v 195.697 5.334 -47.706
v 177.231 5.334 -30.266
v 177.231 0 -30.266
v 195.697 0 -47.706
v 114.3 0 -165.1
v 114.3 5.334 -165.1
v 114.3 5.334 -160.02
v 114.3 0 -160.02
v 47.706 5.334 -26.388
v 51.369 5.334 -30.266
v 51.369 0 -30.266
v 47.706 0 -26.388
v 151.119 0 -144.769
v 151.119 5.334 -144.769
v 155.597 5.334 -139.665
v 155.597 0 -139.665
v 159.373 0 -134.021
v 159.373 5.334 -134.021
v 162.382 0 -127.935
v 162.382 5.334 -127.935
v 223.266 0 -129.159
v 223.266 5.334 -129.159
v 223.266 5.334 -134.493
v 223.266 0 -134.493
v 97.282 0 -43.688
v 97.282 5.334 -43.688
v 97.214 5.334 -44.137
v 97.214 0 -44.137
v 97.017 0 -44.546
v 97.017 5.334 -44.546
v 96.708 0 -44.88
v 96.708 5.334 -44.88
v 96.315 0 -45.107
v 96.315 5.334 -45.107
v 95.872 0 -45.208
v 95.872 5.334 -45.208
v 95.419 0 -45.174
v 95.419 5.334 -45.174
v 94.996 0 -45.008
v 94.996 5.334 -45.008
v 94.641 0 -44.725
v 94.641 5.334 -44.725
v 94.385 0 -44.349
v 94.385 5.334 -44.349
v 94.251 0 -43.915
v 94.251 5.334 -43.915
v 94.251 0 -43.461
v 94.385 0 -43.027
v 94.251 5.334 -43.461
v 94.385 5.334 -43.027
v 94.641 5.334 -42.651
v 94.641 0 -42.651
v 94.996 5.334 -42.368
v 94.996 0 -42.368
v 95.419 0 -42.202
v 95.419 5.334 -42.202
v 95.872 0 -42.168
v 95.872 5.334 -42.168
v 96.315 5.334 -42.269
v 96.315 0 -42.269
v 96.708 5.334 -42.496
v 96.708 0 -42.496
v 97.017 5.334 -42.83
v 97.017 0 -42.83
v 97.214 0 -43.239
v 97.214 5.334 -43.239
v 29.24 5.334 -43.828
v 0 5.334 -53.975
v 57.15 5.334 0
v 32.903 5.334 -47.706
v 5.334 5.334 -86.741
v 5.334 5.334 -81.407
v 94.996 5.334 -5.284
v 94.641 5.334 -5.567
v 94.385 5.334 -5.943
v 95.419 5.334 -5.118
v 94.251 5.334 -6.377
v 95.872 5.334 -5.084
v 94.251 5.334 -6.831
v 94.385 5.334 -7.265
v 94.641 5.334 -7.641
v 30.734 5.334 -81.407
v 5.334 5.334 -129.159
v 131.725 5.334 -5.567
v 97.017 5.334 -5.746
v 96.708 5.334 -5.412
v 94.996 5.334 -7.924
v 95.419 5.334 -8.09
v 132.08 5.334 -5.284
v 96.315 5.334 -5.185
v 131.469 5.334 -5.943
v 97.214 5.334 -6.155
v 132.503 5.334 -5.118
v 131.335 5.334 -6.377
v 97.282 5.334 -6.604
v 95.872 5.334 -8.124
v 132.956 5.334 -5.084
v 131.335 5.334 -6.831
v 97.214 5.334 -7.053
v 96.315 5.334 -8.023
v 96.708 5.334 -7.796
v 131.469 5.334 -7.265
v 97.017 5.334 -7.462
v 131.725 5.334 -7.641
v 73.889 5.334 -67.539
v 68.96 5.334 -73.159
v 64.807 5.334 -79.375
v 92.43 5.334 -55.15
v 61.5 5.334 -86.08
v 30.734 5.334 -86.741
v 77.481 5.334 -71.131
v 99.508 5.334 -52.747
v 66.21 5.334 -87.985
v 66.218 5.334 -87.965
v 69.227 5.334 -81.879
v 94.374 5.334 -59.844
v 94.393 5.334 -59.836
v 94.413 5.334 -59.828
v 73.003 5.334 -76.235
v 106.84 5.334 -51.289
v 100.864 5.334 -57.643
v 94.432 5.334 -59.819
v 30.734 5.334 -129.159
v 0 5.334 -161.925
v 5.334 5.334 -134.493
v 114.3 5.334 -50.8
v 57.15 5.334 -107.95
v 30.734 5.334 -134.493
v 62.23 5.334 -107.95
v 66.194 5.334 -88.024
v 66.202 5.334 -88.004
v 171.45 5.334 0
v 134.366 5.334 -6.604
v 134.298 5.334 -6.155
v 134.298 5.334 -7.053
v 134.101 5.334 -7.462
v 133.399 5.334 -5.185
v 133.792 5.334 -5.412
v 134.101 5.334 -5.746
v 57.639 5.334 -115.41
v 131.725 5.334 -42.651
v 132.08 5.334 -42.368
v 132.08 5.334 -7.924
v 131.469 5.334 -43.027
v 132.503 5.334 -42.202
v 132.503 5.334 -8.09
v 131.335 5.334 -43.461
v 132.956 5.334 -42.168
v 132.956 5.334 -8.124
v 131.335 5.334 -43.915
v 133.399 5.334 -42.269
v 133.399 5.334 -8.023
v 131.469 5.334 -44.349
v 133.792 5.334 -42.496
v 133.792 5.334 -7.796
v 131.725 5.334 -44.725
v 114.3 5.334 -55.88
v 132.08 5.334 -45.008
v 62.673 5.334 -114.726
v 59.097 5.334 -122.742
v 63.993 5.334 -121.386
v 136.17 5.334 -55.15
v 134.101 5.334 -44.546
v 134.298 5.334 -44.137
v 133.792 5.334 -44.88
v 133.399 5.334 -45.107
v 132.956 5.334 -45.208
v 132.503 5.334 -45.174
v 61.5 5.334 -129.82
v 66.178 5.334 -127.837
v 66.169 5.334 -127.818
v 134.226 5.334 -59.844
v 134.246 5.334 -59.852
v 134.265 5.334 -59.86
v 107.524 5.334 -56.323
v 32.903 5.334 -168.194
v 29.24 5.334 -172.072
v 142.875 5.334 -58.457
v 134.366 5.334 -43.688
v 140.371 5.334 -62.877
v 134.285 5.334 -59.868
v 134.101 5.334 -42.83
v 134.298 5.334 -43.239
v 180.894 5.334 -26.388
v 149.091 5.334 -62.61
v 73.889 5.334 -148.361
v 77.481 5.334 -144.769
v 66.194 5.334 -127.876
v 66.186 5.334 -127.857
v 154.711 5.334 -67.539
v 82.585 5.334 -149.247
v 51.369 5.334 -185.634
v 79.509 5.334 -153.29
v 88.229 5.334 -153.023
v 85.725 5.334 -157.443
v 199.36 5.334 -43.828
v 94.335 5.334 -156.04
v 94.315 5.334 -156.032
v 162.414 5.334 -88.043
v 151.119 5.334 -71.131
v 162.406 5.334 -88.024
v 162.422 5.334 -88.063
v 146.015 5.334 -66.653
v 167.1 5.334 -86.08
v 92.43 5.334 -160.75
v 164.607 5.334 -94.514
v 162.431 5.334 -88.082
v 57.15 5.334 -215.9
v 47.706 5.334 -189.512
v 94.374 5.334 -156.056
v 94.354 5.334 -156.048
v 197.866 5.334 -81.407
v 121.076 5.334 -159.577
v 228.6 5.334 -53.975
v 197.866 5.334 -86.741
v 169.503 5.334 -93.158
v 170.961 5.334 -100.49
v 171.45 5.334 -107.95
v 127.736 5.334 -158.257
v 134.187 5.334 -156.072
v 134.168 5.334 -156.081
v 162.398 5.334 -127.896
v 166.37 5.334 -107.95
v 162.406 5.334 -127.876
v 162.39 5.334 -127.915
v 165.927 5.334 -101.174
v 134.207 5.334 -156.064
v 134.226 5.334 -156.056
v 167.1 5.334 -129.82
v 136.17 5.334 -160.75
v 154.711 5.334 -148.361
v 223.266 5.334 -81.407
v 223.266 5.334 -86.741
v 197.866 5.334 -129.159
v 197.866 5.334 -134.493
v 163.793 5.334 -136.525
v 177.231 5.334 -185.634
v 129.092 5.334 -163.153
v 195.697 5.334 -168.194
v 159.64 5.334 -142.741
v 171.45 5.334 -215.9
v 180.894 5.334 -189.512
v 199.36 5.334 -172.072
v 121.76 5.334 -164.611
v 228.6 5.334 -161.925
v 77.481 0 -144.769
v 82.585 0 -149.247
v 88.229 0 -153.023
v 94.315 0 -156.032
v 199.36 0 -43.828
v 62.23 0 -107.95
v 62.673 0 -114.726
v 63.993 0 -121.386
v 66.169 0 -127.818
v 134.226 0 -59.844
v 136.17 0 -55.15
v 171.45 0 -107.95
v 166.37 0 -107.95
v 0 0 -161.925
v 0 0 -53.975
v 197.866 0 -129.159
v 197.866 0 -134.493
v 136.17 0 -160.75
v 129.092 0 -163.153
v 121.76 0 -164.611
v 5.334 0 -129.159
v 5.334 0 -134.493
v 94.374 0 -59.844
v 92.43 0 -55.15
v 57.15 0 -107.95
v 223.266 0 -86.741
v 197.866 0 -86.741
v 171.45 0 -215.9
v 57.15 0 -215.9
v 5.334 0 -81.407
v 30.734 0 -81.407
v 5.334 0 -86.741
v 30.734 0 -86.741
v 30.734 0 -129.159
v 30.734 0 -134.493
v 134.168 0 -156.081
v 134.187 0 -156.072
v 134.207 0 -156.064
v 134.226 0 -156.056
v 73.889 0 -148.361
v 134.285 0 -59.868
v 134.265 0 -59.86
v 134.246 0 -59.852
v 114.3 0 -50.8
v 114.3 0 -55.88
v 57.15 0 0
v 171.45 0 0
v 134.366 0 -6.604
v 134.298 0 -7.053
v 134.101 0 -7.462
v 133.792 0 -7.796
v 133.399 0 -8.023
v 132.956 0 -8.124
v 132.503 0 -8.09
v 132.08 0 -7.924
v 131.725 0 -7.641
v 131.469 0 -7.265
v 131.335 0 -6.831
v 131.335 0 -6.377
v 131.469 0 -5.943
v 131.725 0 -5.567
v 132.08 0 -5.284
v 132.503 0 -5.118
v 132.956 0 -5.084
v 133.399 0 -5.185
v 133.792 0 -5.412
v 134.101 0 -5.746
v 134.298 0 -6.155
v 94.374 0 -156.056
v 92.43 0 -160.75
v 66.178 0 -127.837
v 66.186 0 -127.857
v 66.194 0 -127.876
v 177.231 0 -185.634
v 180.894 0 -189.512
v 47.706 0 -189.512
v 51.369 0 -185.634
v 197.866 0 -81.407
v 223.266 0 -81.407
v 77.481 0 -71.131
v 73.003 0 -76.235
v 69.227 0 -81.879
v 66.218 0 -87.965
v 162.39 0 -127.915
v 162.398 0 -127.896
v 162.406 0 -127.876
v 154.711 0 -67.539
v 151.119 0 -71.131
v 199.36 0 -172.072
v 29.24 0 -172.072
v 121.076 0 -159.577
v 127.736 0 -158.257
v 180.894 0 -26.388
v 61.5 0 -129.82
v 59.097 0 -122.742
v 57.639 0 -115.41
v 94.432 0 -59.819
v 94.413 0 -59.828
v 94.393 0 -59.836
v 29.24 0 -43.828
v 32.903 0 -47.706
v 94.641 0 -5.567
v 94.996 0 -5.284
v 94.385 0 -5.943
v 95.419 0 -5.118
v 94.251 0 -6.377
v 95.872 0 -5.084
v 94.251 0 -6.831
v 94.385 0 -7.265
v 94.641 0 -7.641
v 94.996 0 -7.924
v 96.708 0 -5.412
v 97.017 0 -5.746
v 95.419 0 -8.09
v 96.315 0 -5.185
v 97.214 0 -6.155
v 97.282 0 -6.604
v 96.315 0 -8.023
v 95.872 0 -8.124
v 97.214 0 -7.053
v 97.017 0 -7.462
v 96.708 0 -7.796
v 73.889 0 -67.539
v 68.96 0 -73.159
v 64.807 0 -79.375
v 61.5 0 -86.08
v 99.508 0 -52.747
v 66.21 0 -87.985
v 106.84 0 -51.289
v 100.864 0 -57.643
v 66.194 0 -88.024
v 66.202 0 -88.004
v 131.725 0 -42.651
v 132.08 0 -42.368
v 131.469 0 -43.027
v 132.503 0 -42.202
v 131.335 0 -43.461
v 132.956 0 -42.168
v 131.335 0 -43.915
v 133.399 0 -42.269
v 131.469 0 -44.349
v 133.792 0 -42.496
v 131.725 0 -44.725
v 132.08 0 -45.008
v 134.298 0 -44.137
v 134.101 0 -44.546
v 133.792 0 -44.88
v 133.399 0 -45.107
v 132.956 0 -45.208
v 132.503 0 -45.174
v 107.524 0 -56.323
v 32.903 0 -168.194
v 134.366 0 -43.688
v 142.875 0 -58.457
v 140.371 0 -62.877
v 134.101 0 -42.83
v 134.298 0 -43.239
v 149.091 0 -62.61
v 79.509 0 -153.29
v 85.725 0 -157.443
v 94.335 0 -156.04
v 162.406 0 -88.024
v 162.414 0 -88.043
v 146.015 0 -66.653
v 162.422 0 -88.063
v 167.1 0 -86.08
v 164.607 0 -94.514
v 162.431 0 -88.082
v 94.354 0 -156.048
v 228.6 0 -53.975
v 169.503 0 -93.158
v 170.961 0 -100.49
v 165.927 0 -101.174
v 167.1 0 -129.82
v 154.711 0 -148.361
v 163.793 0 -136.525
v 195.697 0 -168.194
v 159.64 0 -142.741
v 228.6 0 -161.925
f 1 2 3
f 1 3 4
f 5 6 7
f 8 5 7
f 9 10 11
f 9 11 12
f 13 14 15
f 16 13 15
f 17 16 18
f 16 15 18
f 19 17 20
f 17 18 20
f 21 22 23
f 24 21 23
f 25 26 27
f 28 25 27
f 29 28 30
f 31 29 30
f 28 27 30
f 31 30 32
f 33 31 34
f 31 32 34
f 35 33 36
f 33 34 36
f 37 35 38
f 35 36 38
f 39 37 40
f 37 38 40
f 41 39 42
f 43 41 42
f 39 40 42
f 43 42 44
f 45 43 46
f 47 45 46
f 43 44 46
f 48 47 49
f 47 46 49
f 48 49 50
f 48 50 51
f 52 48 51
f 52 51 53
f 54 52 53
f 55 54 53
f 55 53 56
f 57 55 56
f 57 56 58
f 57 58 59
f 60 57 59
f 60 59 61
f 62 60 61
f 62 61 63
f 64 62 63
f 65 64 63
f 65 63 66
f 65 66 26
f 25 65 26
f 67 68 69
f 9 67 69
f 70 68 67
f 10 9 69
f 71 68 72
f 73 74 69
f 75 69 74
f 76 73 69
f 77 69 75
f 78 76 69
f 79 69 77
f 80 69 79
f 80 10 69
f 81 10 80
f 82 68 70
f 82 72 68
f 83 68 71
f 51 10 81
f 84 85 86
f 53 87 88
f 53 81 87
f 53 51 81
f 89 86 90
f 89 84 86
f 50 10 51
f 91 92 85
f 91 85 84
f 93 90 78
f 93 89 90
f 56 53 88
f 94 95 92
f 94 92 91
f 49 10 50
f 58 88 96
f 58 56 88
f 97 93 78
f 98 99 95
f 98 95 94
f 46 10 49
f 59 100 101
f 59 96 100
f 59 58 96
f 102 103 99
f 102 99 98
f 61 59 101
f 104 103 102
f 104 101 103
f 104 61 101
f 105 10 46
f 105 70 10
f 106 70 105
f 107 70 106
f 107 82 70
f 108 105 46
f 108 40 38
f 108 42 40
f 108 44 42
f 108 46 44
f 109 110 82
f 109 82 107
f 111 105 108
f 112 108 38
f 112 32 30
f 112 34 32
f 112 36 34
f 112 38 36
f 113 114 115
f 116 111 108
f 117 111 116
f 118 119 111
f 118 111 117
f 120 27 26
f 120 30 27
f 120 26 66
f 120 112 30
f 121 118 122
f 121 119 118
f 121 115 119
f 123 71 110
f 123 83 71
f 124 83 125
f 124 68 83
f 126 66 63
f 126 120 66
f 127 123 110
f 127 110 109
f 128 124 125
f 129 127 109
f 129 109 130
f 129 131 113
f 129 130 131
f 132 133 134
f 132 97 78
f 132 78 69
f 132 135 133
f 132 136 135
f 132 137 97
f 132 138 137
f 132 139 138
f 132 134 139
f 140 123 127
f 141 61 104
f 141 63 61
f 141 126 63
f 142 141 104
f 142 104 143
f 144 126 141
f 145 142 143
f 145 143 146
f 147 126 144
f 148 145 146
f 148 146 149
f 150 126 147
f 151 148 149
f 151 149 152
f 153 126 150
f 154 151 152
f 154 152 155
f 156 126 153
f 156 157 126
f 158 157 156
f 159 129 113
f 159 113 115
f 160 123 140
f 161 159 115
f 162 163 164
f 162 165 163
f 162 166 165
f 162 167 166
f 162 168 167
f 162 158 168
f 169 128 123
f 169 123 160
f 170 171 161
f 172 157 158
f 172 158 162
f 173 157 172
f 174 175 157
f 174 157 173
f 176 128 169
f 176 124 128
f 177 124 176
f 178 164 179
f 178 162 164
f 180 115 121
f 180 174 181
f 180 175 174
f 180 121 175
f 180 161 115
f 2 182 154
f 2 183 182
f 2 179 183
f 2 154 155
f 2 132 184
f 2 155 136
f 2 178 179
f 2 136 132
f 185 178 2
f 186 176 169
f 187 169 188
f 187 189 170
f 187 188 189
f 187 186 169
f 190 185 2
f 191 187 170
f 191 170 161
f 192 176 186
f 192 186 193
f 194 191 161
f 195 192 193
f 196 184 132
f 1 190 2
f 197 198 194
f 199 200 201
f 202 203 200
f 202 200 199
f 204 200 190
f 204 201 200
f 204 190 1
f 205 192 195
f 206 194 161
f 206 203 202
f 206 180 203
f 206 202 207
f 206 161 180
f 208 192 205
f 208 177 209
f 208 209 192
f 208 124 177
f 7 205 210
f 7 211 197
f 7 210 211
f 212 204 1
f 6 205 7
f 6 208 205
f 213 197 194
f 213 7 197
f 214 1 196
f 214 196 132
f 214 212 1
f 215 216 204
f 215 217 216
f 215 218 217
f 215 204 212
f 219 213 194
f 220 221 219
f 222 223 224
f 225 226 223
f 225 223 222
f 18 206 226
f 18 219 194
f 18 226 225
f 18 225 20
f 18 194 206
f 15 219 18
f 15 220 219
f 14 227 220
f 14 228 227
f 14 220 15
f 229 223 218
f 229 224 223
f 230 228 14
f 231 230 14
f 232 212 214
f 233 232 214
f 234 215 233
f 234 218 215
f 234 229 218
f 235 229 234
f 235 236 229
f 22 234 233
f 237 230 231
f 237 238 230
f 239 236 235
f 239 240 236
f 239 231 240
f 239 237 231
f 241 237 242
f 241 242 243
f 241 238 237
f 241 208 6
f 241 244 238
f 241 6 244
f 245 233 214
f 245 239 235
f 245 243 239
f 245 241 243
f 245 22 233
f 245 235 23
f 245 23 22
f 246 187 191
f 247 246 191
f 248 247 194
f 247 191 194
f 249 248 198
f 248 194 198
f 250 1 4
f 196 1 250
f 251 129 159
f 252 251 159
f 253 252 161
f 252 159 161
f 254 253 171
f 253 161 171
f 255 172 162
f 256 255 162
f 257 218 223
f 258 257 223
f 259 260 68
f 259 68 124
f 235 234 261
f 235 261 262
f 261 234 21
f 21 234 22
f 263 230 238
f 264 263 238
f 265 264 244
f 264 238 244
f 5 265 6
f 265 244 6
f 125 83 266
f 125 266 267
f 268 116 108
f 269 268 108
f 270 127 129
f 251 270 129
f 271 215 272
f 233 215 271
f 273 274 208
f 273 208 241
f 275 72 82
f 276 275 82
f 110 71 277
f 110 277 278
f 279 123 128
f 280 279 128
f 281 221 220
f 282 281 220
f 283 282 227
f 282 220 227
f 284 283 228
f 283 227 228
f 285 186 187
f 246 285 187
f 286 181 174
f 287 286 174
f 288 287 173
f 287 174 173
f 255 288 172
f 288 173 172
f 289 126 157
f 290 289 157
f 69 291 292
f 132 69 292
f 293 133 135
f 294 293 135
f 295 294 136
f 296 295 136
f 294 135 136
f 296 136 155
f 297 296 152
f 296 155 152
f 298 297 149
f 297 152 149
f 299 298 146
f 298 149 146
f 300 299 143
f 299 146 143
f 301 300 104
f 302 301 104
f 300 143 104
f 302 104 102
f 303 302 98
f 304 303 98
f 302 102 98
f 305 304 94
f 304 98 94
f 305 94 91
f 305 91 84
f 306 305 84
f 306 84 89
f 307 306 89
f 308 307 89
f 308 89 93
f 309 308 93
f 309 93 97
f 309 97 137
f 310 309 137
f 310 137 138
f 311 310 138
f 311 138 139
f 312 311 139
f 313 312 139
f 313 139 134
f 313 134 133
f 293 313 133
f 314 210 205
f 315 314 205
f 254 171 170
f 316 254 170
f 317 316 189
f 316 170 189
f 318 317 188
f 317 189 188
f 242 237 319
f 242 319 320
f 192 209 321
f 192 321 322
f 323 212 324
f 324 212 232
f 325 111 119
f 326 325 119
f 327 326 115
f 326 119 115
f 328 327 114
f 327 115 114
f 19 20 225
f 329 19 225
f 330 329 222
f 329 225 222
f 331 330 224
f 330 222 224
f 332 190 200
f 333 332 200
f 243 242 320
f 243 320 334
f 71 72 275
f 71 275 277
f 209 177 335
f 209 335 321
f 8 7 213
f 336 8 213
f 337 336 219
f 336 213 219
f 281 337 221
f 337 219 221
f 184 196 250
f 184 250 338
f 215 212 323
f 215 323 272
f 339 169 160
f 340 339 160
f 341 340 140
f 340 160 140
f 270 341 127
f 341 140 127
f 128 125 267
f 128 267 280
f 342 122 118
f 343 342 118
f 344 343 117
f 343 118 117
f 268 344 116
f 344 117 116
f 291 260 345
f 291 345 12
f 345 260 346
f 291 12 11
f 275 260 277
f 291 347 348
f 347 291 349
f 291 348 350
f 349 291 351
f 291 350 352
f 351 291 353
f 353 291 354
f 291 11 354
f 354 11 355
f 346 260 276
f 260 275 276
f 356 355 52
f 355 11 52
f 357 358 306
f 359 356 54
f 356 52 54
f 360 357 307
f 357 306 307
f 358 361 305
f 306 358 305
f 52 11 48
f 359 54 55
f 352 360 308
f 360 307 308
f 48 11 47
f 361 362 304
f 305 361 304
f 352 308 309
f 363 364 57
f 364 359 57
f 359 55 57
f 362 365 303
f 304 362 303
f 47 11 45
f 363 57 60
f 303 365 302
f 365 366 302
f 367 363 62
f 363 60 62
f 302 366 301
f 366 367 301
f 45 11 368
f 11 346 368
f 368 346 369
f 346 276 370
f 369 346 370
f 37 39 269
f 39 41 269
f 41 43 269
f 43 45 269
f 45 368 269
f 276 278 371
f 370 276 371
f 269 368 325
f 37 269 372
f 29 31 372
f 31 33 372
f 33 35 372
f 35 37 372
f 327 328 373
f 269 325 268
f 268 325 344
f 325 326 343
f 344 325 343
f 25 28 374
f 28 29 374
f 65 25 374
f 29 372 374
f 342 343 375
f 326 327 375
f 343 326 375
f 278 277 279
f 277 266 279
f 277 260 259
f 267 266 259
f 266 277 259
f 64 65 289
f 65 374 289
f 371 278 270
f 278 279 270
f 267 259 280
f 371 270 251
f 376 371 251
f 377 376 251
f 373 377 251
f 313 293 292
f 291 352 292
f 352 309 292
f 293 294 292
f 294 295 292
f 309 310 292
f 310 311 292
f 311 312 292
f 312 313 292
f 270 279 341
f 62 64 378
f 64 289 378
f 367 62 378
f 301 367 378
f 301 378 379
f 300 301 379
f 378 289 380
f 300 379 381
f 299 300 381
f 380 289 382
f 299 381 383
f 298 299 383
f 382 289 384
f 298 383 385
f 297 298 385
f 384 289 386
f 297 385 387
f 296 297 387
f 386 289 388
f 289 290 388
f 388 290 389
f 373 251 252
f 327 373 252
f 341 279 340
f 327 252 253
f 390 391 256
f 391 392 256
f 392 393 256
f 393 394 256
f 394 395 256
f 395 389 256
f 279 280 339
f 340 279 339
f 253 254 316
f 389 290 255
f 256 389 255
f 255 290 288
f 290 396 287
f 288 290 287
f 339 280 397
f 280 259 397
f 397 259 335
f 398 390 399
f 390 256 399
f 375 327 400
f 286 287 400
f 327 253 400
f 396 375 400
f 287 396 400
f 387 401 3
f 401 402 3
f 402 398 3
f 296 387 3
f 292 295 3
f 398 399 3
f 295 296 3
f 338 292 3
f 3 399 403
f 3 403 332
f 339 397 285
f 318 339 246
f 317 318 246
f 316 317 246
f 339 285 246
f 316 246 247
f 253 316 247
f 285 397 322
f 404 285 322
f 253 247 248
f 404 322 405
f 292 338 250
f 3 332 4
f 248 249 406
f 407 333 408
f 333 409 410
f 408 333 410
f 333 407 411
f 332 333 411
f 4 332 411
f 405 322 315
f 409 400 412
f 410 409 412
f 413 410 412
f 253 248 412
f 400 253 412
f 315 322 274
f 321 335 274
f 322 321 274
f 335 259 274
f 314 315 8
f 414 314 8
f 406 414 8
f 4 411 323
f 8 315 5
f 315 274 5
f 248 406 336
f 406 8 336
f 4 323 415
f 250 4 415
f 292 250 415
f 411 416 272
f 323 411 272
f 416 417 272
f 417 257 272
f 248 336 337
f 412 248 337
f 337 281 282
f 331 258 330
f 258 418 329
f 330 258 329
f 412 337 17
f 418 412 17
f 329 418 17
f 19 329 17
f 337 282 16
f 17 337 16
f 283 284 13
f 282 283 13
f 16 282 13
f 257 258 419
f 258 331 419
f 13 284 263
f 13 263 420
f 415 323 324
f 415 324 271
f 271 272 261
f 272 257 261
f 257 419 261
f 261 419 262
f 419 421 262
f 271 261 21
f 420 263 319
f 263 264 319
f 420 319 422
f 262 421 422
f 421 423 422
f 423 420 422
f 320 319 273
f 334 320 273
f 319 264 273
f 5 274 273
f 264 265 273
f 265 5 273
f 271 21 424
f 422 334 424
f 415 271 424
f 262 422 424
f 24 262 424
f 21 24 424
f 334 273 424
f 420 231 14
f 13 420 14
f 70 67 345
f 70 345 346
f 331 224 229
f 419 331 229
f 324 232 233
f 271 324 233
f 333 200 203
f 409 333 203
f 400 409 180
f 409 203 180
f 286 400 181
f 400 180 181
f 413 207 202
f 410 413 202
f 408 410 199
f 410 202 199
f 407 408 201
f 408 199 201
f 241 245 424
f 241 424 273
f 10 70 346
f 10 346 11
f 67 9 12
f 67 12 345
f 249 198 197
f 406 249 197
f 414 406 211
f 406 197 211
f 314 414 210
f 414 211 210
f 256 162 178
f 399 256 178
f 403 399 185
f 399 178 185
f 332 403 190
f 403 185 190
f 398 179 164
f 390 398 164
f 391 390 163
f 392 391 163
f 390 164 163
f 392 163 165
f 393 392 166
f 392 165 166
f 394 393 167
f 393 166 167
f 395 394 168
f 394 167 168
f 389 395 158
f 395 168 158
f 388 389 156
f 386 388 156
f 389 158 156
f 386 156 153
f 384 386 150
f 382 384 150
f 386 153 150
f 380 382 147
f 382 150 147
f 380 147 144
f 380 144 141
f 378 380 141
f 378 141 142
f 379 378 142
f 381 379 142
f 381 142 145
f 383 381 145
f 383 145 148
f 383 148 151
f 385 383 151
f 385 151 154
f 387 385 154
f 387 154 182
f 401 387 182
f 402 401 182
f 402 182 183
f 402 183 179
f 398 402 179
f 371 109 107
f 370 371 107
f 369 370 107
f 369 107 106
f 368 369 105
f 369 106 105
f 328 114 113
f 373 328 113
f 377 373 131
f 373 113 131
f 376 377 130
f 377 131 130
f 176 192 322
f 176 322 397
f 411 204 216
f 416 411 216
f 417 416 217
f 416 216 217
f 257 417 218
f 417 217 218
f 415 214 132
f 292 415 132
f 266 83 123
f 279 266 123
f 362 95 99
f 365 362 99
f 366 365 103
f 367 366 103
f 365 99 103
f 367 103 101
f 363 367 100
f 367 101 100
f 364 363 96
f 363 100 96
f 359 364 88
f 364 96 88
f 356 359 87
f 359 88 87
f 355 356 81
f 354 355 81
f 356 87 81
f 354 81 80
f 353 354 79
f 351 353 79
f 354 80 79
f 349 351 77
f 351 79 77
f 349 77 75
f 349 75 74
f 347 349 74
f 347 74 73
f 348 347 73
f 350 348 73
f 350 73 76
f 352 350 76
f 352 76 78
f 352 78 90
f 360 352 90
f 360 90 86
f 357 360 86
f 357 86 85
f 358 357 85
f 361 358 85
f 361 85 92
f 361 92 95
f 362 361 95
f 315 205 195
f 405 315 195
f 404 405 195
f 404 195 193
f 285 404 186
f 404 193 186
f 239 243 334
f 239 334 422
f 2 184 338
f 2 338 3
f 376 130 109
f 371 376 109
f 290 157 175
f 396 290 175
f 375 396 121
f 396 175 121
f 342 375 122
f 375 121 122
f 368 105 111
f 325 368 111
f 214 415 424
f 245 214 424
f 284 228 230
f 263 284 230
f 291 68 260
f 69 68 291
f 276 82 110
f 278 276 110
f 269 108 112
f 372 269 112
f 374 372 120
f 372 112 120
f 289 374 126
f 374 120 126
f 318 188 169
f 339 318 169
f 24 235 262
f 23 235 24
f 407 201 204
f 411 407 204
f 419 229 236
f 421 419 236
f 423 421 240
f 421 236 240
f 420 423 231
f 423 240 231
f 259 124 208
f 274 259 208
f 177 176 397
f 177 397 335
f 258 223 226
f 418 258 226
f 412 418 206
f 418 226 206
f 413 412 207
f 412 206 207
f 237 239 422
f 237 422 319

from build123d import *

# Parameters (mm, degrees)
SKETCH1_W           = 228.6
SKETCH1_H           = 215.9
BOSS_EXTRUDE1_DEPTH = 5.334
SKETCH8_W           = 25.4
SKETCH8_H           = 5.334
CUT_EXTRUDE2_DEPTH  = 6.334
SKETCH11_R          = 1.524
CUT_EXTRUDE4_DEPTH  = 6.334
CUT_EXTRUDE5_DEPTH  = 6.334
CUT_EXTRUDE6_DEPTH  = 6.334
CIRPATTERN1_COUNT   = 8
CUT_EXTRUDE7_DEPTH  = 6.334


with BuildPart() as part:
    # Sketch1 → Boss-Extrude1 (new body)
    with BuildSketch(Plane(origin=(0, 0, 0), x_dir=(1, 0, 0), z_dir=(0, 1, 0))):
        with Locations((114.3, 107.95)):
            Rectangle(SKETCH1_W, SKETCH1_H)
    extrude(amount=BOSS_EXTRUDE1_DEPTH)

    # Sketch8 → Cut-Extrude2 (cut, through all)
    with BuildSketch(Plane(origin=(0, 5.334, 0), x_dir=(1, 0, 0), z_dir=(0, 1, 0))):
        with Locations((18.034, 131.826)):
            Rectangle(SKETCH8_W, SKETCH8_H)
        with Locations((210.566, 131.826)):
            Rectangle(SKETCH8_W, SKETCH8_H)
        with Locations((210.566, 84.074)):
            Rectangle(SKETCH8_W, SKETCH8_H)
        with Locations((18.034, 84.074)):
            Rectangle(SKETCH8_W, SKETCH8_H)
    extrude(amount=-CUT_EXTRUDE2_DEPTH, mode=Mode.SUBTRACT)

    # Sketch11 → Cut-Extrude4 (cut, through all)
    with BuildSketch(Plane(origin=(0, 5.334, 0), x_dir=(1, 0, 0), z_dir=(0, 1, 0))):
        with Locations((95.758, 6.604)):
            Circle(SKETCH11_R)
        with Locations((132.842, 6.604)):
            Circle(SKETCH11_R)
        with Locations((132.842, 43.688)):
            Circle(SKETCH11_R)
        with Locations((95.758, 43.688)):
            Circle(SKETCH11_R)
    extrude(amount=-CUT_EXTRUDE4_DEPTH, mode=Mode.SUBTRACT)

    # Sketch13 → Cut-Extrude5 (cut, through all)
    with BuildSketch(Plane(origin=(0, 5.334, 0), x_dir=(1, 0, 0), z_dir=(0, 1, 0))):
        Polygon((0, 215.9), (0, 161.925), (57.15, 215.9), align=None)
        Polygon((228.6, 161.925), (171.45, 215.9), (228.6, 215.9), align=None)
        Polygon((228.6, 0), (228.6, 53.975), (171.45, 0), align=None)
        Polygon((0, 53.975), (57.15, 0), (0, 0), align=None)
    extrude(amount=-CUT_EXTRUDE5_DEPTH, mode=Mode.SUBTRACT)

    # Sketch6 → Cut-Extrude6 (cut, through all)
    with BuildSketch(Plane(origin=(0, 5.334, 0), x_dir=(1, 0, 0), z_dir=(0, 1, 0))):
        with BuildLine():
            Line((114.3, 165.1), (114.3, 160.02))
            ThreePointArc((114.3, 160.02), (124.427414599, 159.025633853), (134.168028422, 156.080513675))
            ThreePointArc((134.168028422, 156.080513675), (134.197181023, 156.068469295), (134.226326323, 156.056407258))
            Line((134.226326323, 156.056407258), (136.17035816, 160.749715283))
            ThreePointArc((136.17035816, 160.749715283), (125.449411903, 164.001878775), (114.3, 165.1))
        make_face()
    cut_extrude6 = extrude(amount=-CUT_EXTRUDE6_DEPTH, mode=Mode.SUBTRACT)

    # CirPattern1: Cut-Extrude6 ×8 about axis
    cirpattern1_axis = Axis((114.3, 0, -107.95), (0, 1, 0))
    for i in range(1, CIRPATTERN1_COUNT):
        add(cut_extrude6.rotate(cirpattern1_axis, i * 360 / CIRPATTERN1_COUNT), mode=Mode.SUBTRACT)

    # Sketch16 → Cut-Extrude7 (cut, through all)
    with BuildSketch(Plane(origin=(0, 5.334, 0), x_dir=(1, 0, 0), z_dir=(0, 1, 0))):
        Polygon((180.893807675, 189.512113449), (199.35994175, 172.071875712), (195.697491825, 168.193987556), (177.23135775, 185.634225293), align=None)
        Polygon((47.706192325, 189.512113449), (51.36864225, 185.634225293), (32.902508175, 168.193987556), (29.24005825, 172.071875712), align=None)
        Polygon((47.706192325, 26.387886551), (29.24005825, 43.828124288), (32.902508175, 47.706012444), (51.36864225, 30.265774707), align=None)
        Polygon((180.893807675, 26.387886551), (177.23135775, 30.265774707), (195.697491825, 47.706012444), (199.35994175, 43.828124288), align=None)
    extrude(amount=-CUT_EXTRUDE7_DEPTH, mode=Mode.SUBTRACT)


solid = part.part
